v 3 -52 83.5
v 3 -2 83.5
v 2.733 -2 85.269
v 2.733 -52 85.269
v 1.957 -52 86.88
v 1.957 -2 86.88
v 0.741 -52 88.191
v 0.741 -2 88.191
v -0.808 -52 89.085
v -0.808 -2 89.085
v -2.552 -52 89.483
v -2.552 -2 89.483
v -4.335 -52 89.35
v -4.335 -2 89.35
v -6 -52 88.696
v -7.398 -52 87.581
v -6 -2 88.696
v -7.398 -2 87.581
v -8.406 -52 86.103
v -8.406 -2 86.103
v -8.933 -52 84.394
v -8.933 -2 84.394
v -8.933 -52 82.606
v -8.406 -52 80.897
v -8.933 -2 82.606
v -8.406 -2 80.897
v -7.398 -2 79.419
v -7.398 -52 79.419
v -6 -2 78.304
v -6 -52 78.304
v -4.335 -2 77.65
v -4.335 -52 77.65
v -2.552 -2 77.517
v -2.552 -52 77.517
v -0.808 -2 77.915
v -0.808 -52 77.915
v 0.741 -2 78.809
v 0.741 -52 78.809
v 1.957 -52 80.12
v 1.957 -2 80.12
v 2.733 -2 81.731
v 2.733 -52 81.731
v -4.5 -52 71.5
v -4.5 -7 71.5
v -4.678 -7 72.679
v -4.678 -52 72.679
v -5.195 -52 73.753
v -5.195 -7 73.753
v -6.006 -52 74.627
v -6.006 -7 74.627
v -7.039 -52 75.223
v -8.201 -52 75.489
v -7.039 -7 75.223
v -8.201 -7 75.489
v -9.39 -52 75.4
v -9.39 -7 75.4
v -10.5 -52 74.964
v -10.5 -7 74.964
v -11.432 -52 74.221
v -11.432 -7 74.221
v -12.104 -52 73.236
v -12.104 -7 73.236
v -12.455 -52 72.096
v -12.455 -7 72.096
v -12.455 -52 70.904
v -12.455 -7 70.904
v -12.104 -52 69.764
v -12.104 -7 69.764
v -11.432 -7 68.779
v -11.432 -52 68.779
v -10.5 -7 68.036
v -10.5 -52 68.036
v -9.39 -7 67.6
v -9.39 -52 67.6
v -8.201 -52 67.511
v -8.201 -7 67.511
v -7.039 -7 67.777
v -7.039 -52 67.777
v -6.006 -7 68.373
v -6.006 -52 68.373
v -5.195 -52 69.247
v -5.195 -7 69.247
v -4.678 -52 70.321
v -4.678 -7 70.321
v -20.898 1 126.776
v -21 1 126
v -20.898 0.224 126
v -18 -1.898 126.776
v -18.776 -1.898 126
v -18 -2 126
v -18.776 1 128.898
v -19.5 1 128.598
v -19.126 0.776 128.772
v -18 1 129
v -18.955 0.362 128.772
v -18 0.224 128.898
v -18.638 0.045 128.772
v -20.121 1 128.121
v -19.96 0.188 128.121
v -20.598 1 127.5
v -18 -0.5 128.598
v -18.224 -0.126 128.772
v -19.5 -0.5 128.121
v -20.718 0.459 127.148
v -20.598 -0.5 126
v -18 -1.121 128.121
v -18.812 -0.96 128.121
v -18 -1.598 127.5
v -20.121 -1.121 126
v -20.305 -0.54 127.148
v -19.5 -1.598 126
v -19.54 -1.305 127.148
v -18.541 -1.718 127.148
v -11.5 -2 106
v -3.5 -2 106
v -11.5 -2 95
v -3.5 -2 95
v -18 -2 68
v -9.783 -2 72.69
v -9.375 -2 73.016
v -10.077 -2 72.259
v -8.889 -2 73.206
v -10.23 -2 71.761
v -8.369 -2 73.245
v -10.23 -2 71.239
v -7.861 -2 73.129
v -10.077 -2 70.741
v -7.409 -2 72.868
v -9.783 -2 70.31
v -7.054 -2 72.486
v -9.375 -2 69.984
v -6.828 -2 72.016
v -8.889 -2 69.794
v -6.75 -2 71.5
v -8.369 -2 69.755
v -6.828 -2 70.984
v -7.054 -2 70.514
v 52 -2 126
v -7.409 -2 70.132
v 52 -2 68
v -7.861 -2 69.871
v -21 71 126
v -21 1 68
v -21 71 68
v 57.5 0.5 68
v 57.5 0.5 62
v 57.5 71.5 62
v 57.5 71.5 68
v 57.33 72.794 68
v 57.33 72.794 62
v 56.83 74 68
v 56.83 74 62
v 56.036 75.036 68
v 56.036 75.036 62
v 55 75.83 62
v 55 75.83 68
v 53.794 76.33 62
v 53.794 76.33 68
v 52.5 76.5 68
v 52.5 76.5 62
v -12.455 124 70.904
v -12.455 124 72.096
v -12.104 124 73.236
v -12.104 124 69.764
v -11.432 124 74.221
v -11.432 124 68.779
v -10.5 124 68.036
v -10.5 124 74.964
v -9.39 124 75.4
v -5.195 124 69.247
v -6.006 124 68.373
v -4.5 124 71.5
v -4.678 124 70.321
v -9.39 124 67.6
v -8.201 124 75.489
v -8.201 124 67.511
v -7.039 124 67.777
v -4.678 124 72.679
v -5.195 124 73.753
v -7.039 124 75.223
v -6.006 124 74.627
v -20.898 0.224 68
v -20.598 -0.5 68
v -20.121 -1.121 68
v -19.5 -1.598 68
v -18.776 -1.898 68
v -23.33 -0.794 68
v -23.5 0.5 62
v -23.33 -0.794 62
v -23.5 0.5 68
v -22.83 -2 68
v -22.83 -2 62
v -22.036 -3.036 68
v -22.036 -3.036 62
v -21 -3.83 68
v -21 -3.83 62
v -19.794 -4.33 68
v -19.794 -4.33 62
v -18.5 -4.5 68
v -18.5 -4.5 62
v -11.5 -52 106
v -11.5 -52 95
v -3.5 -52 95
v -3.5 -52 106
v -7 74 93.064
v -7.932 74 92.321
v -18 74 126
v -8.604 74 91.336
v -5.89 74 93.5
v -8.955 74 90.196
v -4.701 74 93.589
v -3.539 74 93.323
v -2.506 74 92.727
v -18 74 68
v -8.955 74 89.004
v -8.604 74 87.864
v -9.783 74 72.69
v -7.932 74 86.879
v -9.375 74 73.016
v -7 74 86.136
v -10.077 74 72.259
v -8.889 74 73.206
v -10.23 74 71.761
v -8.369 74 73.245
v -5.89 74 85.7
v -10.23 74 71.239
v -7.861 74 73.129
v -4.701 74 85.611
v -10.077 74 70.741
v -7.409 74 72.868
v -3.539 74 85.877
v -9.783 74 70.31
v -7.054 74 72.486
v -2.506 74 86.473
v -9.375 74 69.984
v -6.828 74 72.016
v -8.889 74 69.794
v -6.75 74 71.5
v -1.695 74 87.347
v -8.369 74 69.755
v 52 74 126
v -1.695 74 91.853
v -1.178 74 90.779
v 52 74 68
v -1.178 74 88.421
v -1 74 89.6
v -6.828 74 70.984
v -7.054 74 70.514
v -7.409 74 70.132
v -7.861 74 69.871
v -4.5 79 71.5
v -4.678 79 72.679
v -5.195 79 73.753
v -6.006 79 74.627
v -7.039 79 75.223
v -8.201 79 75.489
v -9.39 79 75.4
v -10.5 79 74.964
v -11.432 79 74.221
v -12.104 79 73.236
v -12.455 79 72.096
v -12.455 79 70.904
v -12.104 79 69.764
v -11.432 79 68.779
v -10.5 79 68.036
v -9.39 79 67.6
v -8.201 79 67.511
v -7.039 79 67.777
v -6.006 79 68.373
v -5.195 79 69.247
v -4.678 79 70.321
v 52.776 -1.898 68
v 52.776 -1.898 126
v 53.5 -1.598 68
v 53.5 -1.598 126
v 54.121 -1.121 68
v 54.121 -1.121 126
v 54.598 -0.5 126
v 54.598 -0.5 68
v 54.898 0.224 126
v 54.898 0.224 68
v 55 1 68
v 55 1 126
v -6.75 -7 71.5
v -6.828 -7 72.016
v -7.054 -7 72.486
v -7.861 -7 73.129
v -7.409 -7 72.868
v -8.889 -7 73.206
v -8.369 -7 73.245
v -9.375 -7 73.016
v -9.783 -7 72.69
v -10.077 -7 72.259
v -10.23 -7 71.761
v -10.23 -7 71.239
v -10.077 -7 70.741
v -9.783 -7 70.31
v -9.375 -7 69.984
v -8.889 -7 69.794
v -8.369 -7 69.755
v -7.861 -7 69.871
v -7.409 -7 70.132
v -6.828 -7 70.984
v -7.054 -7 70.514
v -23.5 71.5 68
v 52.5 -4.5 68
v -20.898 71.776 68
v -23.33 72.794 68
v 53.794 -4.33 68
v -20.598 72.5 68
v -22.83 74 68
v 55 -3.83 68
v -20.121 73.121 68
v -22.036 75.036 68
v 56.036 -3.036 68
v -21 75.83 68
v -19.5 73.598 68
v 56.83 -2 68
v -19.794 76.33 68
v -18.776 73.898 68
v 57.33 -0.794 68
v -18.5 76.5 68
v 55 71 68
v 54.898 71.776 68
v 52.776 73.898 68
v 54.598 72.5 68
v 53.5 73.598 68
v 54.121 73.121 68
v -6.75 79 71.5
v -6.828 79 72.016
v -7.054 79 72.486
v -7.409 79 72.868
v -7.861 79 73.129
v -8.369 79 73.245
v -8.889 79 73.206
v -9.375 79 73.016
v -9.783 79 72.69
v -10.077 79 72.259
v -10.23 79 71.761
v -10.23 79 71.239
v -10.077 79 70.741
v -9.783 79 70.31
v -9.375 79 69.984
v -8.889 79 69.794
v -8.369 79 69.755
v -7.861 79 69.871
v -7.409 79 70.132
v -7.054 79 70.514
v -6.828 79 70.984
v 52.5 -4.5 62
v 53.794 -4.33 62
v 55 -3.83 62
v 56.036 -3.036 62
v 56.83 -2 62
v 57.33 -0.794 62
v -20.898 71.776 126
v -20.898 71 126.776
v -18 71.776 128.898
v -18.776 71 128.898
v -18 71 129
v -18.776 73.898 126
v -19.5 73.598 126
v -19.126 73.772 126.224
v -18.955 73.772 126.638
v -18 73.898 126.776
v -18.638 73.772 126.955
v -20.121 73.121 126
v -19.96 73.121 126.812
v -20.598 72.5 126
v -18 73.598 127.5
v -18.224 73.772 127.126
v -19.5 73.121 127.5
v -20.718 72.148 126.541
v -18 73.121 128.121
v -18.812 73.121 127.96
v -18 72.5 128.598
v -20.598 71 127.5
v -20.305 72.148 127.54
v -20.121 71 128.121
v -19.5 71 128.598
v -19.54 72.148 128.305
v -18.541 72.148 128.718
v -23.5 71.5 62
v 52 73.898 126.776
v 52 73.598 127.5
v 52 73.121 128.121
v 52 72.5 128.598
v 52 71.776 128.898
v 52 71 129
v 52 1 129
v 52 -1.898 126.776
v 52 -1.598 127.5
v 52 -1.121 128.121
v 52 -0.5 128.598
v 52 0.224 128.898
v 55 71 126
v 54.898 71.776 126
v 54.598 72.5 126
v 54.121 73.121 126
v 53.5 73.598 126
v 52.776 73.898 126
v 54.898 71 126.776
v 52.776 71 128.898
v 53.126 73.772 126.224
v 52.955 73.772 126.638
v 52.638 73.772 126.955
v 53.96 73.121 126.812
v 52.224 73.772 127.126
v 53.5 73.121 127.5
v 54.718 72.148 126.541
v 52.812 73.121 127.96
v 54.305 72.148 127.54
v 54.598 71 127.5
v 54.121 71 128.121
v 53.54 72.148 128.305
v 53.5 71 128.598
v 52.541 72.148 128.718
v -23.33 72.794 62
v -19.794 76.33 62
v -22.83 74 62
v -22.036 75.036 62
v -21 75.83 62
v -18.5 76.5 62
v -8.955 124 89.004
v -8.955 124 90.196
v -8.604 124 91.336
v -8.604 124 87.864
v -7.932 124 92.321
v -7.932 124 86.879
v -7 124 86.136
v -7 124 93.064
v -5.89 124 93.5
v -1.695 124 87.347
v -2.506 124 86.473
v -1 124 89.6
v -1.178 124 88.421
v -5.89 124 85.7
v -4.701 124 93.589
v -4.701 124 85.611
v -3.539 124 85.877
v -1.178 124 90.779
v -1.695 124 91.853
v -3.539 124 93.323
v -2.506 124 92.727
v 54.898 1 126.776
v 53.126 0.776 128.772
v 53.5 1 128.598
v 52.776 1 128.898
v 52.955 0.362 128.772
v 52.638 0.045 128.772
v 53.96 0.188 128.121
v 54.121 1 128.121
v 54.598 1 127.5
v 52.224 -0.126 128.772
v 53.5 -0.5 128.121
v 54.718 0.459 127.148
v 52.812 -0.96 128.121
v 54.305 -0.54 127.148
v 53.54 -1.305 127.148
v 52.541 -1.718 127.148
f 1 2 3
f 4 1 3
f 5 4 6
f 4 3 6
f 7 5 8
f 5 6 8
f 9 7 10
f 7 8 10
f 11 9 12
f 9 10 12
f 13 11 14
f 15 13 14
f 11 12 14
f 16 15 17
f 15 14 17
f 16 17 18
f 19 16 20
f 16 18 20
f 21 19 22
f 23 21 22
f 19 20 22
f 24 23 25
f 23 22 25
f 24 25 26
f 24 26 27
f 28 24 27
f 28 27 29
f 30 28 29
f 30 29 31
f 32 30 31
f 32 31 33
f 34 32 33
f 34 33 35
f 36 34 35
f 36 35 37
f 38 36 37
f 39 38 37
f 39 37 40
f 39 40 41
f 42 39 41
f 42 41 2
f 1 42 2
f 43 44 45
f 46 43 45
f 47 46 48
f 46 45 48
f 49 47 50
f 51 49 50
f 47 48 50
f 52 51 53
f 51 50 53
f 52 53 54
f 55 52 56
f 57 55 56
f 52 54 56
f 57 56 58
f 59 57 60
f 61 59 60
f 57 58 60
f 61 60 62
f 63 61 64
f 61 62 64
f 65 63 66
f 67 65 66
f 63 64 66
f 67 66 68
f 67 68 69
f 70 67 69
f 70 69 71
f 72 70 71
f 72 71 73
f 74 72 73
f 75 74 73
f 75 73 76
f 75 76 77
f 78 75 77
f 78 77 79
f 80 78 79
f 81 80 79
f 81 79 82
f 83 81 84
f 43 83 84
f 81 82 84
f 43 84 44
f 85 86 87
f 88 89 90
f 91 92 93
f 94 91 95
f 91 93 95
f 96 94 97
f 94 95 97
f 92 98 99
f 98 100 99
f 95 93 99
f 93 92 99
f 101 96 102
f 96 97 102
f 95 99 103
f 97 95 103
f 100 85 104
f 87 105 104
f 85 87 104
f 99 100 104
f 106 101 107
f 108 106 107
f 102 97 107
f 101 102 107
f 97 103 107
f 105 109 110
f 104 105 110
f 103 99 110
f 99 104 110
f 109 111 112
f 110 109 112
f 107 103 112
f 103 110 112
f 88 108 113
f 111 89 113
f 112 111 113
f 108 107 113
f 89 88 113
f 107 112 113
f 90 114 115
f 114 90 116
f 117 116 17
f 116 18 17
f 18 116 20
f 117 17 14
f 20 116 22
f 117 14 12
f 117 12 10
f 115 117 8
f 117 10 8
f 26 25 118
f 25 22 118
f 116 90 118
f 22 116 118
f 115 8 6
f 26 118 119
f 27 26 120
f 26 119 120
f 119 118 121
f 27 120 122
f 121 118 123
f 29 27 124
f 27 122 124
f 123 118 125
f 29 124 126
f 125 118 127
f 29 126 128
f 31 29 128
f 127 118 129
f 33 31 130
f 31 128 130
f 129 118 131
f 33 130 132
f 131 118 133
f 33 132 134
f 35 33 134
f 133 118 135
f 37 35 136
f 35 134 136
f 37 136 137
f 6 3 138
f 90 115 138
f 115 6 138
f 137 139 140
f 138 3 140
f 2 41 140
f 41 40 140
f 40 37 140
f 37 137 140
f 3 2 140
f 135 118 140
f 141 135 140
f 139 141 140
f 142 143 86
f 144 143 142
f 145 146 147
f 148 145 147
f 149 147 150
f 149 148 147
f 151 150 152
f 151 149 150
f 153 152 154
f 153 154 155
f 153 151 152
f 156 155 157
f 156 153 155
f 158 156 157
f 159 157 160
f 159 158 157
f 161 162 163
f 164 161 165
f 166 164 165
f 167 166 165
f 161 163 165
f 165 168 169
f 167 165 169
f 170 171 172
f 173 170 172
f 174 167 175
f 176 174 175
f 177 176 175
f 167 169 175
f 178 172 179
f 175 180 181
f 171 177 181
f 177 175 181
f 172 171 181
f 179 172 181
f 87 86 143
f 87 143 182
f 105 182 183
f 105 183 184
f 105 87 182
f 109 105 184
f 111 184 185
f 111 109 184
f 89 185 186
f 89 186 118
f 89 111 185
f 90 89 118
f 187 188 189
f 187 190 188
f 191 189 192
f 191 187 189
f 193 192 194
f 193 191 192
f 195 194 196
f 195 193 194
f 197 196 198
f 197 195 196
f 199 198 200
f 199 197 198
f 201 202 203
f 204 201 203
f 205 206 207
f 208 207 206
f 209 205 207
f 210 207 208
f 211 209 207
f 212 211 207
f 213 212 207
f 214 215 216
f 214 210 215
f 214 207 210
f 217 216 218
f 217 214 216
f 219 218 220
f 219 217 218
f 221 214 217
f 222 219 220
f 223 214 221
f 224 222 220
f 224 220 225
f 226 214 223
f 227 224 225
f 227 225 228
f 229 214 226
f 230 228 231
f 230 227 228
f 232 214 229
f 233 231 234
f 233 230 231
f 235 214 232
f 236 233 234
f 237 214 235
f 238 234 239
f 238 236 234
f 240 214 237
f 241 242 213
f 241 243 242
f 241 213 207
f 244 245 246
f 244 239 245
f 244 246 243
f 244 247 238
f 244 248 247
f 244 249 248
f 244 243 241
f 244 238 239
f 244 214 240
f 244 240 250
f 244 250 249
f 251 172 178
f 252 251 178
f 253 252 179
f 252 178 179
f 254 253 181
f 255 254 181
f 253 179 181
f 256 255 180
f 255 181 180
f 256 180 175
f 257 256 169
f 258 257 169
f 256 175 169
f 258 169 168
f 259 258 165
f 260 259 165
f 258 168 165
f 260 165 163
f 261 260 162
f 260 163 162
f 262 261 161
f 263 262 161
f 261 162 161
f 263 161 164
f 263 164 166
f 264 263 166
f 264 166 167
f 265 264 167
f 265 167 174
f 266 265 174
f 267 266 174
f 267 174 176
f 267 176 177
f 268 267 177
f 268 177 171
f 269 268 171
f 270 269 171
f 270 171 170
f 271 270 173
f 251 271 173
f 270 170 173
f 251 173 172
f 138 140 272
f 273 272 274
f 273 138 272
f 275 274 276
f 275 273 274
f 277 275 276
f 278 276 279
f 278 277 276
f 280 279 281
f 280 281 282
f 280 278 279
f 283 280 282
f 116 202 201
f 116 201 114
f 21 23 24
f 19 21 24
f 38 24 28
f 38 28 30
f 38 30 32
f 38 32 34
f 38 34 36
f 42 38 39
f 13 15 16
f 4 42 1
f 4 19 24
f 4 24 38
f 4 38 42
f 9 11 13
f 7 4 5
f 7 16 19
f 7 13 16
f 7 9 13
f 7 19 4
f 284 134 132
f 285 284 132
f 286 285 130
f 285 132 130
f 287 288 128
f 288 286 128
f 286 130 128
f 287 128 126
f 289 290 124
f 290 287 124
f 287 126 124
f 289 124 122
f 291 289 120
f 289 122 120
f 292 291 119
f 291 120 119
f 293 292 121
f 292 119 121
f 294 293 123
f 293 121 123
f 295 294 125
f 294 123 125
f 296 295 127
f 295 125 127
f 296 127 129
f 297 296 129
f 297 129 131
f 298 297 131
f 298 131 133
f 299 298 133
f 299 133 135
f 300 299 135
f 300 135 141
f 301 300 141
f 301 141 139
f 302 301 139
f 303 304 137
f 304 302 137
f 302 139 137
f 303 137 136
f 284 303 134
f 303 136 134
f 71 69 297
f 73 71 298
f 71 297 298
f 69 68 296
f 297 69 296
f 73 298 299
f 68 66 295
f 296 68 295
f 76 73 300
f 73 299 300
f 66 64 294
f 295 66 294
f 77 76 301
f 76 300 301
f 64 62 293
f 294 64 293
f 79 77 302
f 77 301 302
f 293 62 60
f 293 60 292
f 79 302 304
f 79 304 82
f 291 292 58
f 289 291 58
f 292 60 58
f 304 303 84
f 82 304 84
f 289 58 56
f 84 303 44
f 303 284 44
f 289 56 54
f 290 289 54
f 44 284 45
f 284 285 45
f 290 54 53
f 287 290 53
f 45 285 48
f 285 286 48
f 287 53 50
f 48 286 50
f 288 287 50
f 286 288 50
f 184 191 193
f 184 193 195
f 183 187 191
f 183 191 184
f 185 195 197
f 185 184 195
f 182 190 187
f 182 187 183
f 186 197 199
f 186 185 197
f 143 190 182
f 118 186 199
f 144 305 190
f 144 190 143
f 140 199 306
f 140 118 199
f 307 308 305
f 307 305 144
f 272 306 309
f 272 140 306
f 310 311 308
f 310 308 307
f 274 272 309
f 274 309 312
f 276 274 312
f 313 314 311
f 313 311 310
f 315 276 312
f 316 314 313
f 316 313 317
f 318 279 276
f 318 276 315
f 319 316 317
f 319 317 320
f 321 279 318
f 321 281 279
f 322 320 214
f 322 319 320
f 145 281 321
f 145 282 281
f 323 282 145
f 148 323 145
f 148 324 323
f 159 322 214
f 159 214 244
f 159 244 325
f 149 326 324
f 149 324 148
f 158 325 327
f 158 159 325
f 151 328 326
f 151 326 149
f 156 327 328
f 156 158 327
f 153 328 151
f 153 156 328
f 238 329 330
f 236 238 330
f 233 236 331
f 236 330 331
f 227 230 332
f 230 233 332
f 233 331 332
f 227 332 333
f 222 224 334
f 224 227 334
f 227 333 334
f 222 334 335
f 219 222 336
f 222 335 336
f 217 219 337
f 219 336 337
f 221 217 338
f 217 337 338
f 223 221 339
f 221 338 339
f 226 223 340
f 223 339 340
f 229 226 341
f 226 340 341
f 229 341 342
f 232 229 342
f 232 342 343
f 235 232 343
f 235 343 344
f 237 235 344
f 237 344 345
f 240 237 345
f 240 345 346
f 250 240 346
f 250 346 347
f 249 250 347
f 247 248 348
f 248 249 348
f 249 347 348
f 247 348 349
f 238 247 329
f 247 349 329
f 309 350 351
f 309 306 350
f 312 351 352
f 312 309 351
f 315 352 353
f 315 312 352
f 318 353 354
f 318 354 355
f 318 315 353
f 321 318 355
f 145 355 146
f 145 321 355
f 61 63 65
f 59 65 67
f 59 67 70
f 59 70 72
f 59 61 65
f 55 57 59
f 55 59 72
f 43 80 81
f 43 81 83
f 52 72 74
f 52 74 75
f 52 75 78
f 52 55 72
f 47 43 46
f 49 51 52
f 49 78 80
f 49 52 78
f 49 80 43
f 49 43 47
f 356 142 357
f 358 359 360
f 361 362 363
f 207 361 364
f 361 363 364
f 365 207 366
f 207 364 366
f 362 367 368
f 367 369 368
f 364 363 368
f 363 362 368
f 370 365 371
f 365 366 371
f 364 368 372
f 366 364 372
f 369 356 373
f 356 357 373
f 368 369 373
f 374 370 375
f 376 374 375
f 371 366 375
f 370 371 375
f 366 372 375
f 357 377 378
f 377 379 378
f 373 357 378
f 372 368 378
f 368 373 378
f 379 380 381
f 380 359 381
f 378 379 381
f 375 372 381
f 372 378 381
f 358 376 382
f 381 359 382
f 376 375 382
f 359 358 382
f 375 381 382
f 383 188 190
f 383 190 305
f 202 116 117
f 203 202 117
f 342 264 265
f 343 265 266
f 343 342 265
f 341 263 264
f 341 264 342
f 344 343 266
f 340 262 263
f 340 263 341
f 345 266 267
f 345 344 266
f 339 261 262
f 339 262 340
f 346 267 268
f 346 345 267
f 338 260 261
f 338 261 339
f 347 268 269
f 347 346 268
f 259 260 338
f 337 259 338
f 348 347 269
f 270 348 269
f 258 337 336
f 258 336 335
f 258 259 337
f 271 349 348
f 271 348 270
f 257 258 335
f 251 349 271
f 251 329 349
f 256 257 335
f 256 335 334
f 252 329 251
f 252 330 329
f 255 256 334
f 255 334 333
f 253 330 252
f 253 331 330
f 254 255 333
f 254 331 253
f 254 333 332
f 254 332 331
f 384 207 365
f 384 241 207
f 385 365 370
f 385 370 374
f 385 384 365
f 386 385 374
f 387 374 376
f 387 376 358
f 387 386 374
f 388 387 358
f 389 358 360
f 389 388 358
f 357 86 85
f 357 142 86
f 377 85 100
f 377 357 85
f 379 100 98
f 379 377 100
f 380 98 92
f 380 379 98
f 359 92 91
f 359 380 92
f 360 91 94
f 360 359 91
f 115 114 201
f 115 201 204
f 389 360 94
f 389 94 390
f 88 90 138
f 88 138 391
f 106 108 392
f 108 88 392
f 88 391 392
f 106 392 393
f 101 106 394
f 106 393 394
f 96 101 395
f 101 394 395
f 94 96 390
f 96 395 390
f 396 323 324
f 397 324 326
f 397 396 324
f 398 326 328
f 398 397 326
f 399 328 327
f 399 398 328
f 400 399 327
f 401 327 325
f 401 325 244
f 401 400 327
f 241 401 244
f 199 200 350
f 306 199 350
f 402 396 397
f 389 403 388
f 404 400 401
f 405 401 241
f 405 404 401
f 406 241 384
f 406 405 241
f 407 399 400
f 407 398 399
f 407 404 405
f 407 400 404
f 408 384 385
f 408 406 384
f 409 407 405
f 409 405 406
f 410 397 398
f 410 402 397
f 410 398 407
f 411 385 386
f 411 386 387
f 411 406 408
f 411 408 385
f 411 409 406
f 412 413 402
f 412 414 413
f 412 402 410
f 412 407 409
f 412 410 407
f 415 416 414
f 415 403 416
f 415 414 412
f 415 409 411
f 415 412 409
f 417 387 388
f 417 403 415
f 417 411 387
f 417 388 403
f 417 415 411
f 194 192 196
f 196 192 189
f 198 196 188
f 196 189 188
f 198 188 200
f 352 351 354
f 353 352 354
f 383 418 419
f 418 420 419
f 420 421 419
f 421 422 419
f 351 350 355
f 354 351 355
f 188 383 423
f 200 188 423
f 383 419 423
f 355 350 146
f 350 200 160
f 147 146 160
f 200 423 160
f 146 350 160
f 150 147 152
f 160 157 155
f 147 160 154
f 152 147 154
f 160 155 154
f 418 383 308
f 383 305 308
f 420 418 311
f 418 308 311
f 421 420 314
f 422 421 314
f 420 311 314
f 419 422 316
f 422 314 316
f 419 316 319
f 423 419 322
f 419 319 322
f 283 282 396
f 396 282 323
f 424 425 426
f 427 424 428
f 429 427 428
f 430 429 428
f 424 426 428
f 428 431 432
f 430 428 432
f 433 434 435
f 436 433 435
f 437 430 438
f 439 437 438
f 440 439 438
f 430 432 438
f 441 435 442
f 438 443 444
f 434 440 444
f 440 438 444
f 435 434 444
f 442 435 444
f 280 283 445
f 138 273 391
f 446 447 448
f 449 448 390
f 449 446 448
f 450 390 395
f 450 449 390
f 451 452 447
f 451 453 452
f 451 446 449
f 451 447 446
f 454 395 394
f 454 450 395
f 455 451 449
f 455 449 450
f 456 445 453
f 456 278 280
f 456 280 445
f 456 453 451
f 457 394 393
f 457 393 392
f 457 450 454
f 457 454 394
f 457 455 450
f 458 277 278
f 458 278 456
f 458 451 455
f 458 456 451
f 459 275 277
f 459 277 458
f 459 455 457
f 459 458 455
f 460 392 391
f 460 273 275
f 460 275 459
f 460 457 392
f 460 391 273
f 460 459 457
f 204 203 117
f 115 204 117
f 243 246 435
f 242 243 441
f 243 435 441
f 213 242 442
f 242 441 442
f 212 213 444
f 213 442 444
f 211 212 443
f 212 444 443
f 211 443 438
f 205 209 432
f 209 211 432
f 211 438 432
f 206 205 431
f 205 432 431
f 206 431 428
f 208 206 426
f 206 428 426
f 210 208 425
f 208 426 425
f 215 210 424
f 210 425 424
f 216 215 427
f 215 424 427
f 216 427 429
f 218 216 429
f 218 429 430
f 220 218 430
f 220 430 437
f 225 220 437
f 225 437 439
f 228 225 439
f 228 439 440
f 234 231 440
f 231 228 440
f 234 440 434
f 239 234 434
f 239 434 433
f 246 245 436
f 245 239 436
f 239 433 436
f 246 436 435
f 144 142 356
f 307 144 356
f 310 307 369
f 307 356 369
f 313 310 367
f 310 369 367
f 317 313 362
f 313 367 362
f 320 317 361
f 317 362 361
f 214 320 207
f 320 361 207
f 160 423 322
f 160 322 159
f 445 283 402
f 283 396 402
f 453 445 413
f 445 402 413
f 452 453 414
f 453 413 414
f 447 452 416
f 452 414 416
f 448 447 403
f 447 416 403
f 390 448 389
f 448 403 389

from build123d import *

# Parameters (mm, degrees)
CYLINDER042_R          = 4
CYLINDER042_DEPTH      = 61
CYLINDER042_ROLL_ANGLE = 90
CYLINDER047_R          = 4
CYLINDER047_DEPTH      = 45
CYLINDER047_ROLL_ANGLE = 90
CYLINDER045_R          = 1.75
CYLINDER045_DEPTH      = 31
CYLINDER045_ROLL_ANGLE = 90
CYLINDER046_R          = 4
CYLINDER046_DEPTH      = 45
CYLINDER046_ROLL_ANGLE = 90
CYLINDER043_R          = 6
CYLINDER043_DEPTH      = 63
CYLINDER043_ROLL_ANGLE = 90
BOX038_W               = 8
BOX038_H               = 58
BOX038_DEPTH           = 11
CYLINDER044_R          = 1.75
CYLINDER044_DEPTH      = 23
CYLINDER044_ROLL_ANGLE = 90
BOX040_W               = 81
BOX040_H               = 81
BOX040_DEPTH           = 6
FILLET018008_R         = 5
BOX039_W               = 76
BOX039_H               = 76
BOX039_DEPTH           = 66
FILLET018007_R         = 3


with BuildPart() as cylinder064:
    # Cylinder042 → Cylinder042 (new body)
    with BuildSketch(Plane.XY):
        Circle(CYLINDER042_R)
    extrude(amount=CYLINDER042_DEPTH)


with BuildPart() as cylinder064_1:
    # Cylinder042 roll: moved
    add(cylinder064.part.rotate(Axis((0, 0, 0), (1, 0, 0)), CYLINDER042_ROLL_ANGLE))


with BuildPart() as cylinder064_2:
    # Cylinder042 placement: moved
    add(cylinder064_1.part.moved(Location((-5, 124, 89.6))))


with BuildPart() as cylinder069:
    # Cylinder047 → Cylinder047 (new body)
    with BuildSketch(Plane.XY):
        Circle(CYLINDER047_R)
    extrude(amount=CYLINDER047_DEPTH)


with BuildPart() as cylinder069_1:
    # Cylinder047 roll: moved
    add(cylinder069.part.rotate(Axis((0, 0, 0), (1, 0, 0)), CYLINDER047_ROLL_ANGLE))


with BuildPart() as cylinder069_2:
    # Cylinder047 placement: moved
    add(cylinder069_1.part.moved(Location((-8.5, 124, 71.5))))


with BuildPart() as cylinder067:
    # Cylinder045 → Cylinder045 (new body)
    with BuildSketch(Plane.XY):
        Circle(CYLINDER045_R)
    extrude(amount=CYLINDER045_DEPTH)


with BuildPart() as cylinder067_1:
    # Cylinder045 roll: moved
    add(cylinder067.part.rotate(Axis((0, 0, 0), (1, 0, 0)), CYLINDER045_ROLL_ANGLE))


with BuildPart() as cylinder067_2:
    # Cylinder045 placement: moved
    add(cylinder067_1.part.moved(Location((-8.5, 94, 71.5))))


with BuildPart() as cylinder068:
    # Cylinder046 → Cylinder046 (new body)
    with BuildSketch(Plane.XY):
        Circle(CYLINDER046_R)
    extrude(amount=CYLINDER046_DEPTH)


with BuildPart() as cylinder068_1:
    # Cylinder046 roll: moved
    add(cylinder068.part.rotate(Axis((0, 0, 0), (1, 0, 0)), CYLINDER046_ROLL_ANGLE))


with BuildPart() as cylinder068_2:
    # Cylinder046 placement: moved
    add(cylinder068_1.part.moved(Location((-8.5, -7, 71.5))))


with BuildPart() as cylinder065:
    # Cylinder043 → Cylinder043 (new body)
    with BuildSketch(Plane.XY):
        Circle(CYLINDER043_R)
    extrude(amount=CYLINDER043_DEPTH)


with BuildPart() as cylinder065_1:
    # Cylinder043 roll: moved
    add(cylinder065.part.rotate(Axis((0, 0, 0), (1, 0, 0)), CYLINDER043_ROLL_ANGLE))


with BuildPart() as cylinder065_2:
    # Cylinder043 placement: moved
    add(cylinder065_1.part.moved(Location((-3, 11, 83.5))))


with BuildPart() as cube037:
    # Box038 → Box038 (new body)
    with BuildSketch(Plane(origin=(-11.5, -52, 95), x_dir=(1, 0, 0), z_dir=(0, 0, 1))):
        with Locations((4, 29)):
            Rectangle(BOX038_W, BOX038_H)
    extrude(amount=BOX038_DEPTH)


with BuildPart() as cylinder066:
    # Cylinder044 → Cylinder044 (new body)
    with BuildSketch(Plane.XY):
        Circle(CYLINDER044_R)
    extrude(amount=CYLINDER044_DEPTH)


with BuildPart() as cylinder066_1:
    # Cylinder044 roll: moved
    add(cylinder066.part.rotate(Axis((0, 0, 0), (1, 0, 0)), CYLINDER044_ROLL_ANGLE))


with BuildPart() as cylinder066_2:
    # Cylinder044 placement: moved
    add(cylinder066_1.part.moved(Location((-8.5, 1, 71.5))))


with BuildPart() as fillet018008:
    # Box040 → Box040 (new body)
    with BuildSketch(Plane(origin=(-23.5, -4.5, 63), x_dir=(1, 0, 0), z_dir=(0, 0, 1))):
        with Locations((40.5, 40.5)):
            Rectangle(BOX040_W, BOX040_H)
    extrude(amount=BOX040_DEPTH)

    # Fillet018008
    fillet018008_edges = [fillet018008.edges().sort_by_distance(p)[0] for p in [
        (-23.5, -4.5, 66),
        (-23.5, 76.5, 66),
        (57.5, -4.5, 66),
        (57.5, 76.5, 66),
    ]]
    fillet(fillet018008_edges, radius=FILLET018008_R)


with BuildPart() as fillet018008_1:
    # Fillet018008 placement: moved
    add(fillet018008.part.moved(Location((0, 0, -1))))


with BuildPart() as corte_positivo:
    # Box039 → Box039 (new body)
    with BuildSketch(Plane(origin=(-21, -2, 63), x_dir=(1, 0, 0), z_dir=(0, 0, 1))):
        with Locations((38, 38)):
            Rectangle(BOX039_W, BOX039_H)
    extrude(amount=BOX039_DEPTH)

    # Fillet018007
    fillet018007_edges = [corte_positivo.edges().sort_by_distance(p)[0] for p in [
        (-21, -2, 96),
        (-21, 36, 129),
        (-21, 74, 96),
        (55, -2, 96),
        (55, 36, 129),
        (55, 74, 96),
        (17, -2, 129),
        (17, 74, 129),
    ]]
    fillet(fillet018007_edges, radius=FILLET018007_R)

    # Fusion033: union Fillet018008
    add(fillet018008_1.part)

    # Fusion034: union Cylinder064, Cylinder069, Cylinder067, Cylinder068, Cylinder065, Cube037, Cylinder066
    add(cylinder064_2.part)
    add(cylinder069_2.part)
    add(cylinder067_2.part)
    add(cylinder068_2.part)
    add(cylinder065_2.part)
    add(cube037.part)
    add(cylinder066_2.part)


solid = corte_positivo.part
